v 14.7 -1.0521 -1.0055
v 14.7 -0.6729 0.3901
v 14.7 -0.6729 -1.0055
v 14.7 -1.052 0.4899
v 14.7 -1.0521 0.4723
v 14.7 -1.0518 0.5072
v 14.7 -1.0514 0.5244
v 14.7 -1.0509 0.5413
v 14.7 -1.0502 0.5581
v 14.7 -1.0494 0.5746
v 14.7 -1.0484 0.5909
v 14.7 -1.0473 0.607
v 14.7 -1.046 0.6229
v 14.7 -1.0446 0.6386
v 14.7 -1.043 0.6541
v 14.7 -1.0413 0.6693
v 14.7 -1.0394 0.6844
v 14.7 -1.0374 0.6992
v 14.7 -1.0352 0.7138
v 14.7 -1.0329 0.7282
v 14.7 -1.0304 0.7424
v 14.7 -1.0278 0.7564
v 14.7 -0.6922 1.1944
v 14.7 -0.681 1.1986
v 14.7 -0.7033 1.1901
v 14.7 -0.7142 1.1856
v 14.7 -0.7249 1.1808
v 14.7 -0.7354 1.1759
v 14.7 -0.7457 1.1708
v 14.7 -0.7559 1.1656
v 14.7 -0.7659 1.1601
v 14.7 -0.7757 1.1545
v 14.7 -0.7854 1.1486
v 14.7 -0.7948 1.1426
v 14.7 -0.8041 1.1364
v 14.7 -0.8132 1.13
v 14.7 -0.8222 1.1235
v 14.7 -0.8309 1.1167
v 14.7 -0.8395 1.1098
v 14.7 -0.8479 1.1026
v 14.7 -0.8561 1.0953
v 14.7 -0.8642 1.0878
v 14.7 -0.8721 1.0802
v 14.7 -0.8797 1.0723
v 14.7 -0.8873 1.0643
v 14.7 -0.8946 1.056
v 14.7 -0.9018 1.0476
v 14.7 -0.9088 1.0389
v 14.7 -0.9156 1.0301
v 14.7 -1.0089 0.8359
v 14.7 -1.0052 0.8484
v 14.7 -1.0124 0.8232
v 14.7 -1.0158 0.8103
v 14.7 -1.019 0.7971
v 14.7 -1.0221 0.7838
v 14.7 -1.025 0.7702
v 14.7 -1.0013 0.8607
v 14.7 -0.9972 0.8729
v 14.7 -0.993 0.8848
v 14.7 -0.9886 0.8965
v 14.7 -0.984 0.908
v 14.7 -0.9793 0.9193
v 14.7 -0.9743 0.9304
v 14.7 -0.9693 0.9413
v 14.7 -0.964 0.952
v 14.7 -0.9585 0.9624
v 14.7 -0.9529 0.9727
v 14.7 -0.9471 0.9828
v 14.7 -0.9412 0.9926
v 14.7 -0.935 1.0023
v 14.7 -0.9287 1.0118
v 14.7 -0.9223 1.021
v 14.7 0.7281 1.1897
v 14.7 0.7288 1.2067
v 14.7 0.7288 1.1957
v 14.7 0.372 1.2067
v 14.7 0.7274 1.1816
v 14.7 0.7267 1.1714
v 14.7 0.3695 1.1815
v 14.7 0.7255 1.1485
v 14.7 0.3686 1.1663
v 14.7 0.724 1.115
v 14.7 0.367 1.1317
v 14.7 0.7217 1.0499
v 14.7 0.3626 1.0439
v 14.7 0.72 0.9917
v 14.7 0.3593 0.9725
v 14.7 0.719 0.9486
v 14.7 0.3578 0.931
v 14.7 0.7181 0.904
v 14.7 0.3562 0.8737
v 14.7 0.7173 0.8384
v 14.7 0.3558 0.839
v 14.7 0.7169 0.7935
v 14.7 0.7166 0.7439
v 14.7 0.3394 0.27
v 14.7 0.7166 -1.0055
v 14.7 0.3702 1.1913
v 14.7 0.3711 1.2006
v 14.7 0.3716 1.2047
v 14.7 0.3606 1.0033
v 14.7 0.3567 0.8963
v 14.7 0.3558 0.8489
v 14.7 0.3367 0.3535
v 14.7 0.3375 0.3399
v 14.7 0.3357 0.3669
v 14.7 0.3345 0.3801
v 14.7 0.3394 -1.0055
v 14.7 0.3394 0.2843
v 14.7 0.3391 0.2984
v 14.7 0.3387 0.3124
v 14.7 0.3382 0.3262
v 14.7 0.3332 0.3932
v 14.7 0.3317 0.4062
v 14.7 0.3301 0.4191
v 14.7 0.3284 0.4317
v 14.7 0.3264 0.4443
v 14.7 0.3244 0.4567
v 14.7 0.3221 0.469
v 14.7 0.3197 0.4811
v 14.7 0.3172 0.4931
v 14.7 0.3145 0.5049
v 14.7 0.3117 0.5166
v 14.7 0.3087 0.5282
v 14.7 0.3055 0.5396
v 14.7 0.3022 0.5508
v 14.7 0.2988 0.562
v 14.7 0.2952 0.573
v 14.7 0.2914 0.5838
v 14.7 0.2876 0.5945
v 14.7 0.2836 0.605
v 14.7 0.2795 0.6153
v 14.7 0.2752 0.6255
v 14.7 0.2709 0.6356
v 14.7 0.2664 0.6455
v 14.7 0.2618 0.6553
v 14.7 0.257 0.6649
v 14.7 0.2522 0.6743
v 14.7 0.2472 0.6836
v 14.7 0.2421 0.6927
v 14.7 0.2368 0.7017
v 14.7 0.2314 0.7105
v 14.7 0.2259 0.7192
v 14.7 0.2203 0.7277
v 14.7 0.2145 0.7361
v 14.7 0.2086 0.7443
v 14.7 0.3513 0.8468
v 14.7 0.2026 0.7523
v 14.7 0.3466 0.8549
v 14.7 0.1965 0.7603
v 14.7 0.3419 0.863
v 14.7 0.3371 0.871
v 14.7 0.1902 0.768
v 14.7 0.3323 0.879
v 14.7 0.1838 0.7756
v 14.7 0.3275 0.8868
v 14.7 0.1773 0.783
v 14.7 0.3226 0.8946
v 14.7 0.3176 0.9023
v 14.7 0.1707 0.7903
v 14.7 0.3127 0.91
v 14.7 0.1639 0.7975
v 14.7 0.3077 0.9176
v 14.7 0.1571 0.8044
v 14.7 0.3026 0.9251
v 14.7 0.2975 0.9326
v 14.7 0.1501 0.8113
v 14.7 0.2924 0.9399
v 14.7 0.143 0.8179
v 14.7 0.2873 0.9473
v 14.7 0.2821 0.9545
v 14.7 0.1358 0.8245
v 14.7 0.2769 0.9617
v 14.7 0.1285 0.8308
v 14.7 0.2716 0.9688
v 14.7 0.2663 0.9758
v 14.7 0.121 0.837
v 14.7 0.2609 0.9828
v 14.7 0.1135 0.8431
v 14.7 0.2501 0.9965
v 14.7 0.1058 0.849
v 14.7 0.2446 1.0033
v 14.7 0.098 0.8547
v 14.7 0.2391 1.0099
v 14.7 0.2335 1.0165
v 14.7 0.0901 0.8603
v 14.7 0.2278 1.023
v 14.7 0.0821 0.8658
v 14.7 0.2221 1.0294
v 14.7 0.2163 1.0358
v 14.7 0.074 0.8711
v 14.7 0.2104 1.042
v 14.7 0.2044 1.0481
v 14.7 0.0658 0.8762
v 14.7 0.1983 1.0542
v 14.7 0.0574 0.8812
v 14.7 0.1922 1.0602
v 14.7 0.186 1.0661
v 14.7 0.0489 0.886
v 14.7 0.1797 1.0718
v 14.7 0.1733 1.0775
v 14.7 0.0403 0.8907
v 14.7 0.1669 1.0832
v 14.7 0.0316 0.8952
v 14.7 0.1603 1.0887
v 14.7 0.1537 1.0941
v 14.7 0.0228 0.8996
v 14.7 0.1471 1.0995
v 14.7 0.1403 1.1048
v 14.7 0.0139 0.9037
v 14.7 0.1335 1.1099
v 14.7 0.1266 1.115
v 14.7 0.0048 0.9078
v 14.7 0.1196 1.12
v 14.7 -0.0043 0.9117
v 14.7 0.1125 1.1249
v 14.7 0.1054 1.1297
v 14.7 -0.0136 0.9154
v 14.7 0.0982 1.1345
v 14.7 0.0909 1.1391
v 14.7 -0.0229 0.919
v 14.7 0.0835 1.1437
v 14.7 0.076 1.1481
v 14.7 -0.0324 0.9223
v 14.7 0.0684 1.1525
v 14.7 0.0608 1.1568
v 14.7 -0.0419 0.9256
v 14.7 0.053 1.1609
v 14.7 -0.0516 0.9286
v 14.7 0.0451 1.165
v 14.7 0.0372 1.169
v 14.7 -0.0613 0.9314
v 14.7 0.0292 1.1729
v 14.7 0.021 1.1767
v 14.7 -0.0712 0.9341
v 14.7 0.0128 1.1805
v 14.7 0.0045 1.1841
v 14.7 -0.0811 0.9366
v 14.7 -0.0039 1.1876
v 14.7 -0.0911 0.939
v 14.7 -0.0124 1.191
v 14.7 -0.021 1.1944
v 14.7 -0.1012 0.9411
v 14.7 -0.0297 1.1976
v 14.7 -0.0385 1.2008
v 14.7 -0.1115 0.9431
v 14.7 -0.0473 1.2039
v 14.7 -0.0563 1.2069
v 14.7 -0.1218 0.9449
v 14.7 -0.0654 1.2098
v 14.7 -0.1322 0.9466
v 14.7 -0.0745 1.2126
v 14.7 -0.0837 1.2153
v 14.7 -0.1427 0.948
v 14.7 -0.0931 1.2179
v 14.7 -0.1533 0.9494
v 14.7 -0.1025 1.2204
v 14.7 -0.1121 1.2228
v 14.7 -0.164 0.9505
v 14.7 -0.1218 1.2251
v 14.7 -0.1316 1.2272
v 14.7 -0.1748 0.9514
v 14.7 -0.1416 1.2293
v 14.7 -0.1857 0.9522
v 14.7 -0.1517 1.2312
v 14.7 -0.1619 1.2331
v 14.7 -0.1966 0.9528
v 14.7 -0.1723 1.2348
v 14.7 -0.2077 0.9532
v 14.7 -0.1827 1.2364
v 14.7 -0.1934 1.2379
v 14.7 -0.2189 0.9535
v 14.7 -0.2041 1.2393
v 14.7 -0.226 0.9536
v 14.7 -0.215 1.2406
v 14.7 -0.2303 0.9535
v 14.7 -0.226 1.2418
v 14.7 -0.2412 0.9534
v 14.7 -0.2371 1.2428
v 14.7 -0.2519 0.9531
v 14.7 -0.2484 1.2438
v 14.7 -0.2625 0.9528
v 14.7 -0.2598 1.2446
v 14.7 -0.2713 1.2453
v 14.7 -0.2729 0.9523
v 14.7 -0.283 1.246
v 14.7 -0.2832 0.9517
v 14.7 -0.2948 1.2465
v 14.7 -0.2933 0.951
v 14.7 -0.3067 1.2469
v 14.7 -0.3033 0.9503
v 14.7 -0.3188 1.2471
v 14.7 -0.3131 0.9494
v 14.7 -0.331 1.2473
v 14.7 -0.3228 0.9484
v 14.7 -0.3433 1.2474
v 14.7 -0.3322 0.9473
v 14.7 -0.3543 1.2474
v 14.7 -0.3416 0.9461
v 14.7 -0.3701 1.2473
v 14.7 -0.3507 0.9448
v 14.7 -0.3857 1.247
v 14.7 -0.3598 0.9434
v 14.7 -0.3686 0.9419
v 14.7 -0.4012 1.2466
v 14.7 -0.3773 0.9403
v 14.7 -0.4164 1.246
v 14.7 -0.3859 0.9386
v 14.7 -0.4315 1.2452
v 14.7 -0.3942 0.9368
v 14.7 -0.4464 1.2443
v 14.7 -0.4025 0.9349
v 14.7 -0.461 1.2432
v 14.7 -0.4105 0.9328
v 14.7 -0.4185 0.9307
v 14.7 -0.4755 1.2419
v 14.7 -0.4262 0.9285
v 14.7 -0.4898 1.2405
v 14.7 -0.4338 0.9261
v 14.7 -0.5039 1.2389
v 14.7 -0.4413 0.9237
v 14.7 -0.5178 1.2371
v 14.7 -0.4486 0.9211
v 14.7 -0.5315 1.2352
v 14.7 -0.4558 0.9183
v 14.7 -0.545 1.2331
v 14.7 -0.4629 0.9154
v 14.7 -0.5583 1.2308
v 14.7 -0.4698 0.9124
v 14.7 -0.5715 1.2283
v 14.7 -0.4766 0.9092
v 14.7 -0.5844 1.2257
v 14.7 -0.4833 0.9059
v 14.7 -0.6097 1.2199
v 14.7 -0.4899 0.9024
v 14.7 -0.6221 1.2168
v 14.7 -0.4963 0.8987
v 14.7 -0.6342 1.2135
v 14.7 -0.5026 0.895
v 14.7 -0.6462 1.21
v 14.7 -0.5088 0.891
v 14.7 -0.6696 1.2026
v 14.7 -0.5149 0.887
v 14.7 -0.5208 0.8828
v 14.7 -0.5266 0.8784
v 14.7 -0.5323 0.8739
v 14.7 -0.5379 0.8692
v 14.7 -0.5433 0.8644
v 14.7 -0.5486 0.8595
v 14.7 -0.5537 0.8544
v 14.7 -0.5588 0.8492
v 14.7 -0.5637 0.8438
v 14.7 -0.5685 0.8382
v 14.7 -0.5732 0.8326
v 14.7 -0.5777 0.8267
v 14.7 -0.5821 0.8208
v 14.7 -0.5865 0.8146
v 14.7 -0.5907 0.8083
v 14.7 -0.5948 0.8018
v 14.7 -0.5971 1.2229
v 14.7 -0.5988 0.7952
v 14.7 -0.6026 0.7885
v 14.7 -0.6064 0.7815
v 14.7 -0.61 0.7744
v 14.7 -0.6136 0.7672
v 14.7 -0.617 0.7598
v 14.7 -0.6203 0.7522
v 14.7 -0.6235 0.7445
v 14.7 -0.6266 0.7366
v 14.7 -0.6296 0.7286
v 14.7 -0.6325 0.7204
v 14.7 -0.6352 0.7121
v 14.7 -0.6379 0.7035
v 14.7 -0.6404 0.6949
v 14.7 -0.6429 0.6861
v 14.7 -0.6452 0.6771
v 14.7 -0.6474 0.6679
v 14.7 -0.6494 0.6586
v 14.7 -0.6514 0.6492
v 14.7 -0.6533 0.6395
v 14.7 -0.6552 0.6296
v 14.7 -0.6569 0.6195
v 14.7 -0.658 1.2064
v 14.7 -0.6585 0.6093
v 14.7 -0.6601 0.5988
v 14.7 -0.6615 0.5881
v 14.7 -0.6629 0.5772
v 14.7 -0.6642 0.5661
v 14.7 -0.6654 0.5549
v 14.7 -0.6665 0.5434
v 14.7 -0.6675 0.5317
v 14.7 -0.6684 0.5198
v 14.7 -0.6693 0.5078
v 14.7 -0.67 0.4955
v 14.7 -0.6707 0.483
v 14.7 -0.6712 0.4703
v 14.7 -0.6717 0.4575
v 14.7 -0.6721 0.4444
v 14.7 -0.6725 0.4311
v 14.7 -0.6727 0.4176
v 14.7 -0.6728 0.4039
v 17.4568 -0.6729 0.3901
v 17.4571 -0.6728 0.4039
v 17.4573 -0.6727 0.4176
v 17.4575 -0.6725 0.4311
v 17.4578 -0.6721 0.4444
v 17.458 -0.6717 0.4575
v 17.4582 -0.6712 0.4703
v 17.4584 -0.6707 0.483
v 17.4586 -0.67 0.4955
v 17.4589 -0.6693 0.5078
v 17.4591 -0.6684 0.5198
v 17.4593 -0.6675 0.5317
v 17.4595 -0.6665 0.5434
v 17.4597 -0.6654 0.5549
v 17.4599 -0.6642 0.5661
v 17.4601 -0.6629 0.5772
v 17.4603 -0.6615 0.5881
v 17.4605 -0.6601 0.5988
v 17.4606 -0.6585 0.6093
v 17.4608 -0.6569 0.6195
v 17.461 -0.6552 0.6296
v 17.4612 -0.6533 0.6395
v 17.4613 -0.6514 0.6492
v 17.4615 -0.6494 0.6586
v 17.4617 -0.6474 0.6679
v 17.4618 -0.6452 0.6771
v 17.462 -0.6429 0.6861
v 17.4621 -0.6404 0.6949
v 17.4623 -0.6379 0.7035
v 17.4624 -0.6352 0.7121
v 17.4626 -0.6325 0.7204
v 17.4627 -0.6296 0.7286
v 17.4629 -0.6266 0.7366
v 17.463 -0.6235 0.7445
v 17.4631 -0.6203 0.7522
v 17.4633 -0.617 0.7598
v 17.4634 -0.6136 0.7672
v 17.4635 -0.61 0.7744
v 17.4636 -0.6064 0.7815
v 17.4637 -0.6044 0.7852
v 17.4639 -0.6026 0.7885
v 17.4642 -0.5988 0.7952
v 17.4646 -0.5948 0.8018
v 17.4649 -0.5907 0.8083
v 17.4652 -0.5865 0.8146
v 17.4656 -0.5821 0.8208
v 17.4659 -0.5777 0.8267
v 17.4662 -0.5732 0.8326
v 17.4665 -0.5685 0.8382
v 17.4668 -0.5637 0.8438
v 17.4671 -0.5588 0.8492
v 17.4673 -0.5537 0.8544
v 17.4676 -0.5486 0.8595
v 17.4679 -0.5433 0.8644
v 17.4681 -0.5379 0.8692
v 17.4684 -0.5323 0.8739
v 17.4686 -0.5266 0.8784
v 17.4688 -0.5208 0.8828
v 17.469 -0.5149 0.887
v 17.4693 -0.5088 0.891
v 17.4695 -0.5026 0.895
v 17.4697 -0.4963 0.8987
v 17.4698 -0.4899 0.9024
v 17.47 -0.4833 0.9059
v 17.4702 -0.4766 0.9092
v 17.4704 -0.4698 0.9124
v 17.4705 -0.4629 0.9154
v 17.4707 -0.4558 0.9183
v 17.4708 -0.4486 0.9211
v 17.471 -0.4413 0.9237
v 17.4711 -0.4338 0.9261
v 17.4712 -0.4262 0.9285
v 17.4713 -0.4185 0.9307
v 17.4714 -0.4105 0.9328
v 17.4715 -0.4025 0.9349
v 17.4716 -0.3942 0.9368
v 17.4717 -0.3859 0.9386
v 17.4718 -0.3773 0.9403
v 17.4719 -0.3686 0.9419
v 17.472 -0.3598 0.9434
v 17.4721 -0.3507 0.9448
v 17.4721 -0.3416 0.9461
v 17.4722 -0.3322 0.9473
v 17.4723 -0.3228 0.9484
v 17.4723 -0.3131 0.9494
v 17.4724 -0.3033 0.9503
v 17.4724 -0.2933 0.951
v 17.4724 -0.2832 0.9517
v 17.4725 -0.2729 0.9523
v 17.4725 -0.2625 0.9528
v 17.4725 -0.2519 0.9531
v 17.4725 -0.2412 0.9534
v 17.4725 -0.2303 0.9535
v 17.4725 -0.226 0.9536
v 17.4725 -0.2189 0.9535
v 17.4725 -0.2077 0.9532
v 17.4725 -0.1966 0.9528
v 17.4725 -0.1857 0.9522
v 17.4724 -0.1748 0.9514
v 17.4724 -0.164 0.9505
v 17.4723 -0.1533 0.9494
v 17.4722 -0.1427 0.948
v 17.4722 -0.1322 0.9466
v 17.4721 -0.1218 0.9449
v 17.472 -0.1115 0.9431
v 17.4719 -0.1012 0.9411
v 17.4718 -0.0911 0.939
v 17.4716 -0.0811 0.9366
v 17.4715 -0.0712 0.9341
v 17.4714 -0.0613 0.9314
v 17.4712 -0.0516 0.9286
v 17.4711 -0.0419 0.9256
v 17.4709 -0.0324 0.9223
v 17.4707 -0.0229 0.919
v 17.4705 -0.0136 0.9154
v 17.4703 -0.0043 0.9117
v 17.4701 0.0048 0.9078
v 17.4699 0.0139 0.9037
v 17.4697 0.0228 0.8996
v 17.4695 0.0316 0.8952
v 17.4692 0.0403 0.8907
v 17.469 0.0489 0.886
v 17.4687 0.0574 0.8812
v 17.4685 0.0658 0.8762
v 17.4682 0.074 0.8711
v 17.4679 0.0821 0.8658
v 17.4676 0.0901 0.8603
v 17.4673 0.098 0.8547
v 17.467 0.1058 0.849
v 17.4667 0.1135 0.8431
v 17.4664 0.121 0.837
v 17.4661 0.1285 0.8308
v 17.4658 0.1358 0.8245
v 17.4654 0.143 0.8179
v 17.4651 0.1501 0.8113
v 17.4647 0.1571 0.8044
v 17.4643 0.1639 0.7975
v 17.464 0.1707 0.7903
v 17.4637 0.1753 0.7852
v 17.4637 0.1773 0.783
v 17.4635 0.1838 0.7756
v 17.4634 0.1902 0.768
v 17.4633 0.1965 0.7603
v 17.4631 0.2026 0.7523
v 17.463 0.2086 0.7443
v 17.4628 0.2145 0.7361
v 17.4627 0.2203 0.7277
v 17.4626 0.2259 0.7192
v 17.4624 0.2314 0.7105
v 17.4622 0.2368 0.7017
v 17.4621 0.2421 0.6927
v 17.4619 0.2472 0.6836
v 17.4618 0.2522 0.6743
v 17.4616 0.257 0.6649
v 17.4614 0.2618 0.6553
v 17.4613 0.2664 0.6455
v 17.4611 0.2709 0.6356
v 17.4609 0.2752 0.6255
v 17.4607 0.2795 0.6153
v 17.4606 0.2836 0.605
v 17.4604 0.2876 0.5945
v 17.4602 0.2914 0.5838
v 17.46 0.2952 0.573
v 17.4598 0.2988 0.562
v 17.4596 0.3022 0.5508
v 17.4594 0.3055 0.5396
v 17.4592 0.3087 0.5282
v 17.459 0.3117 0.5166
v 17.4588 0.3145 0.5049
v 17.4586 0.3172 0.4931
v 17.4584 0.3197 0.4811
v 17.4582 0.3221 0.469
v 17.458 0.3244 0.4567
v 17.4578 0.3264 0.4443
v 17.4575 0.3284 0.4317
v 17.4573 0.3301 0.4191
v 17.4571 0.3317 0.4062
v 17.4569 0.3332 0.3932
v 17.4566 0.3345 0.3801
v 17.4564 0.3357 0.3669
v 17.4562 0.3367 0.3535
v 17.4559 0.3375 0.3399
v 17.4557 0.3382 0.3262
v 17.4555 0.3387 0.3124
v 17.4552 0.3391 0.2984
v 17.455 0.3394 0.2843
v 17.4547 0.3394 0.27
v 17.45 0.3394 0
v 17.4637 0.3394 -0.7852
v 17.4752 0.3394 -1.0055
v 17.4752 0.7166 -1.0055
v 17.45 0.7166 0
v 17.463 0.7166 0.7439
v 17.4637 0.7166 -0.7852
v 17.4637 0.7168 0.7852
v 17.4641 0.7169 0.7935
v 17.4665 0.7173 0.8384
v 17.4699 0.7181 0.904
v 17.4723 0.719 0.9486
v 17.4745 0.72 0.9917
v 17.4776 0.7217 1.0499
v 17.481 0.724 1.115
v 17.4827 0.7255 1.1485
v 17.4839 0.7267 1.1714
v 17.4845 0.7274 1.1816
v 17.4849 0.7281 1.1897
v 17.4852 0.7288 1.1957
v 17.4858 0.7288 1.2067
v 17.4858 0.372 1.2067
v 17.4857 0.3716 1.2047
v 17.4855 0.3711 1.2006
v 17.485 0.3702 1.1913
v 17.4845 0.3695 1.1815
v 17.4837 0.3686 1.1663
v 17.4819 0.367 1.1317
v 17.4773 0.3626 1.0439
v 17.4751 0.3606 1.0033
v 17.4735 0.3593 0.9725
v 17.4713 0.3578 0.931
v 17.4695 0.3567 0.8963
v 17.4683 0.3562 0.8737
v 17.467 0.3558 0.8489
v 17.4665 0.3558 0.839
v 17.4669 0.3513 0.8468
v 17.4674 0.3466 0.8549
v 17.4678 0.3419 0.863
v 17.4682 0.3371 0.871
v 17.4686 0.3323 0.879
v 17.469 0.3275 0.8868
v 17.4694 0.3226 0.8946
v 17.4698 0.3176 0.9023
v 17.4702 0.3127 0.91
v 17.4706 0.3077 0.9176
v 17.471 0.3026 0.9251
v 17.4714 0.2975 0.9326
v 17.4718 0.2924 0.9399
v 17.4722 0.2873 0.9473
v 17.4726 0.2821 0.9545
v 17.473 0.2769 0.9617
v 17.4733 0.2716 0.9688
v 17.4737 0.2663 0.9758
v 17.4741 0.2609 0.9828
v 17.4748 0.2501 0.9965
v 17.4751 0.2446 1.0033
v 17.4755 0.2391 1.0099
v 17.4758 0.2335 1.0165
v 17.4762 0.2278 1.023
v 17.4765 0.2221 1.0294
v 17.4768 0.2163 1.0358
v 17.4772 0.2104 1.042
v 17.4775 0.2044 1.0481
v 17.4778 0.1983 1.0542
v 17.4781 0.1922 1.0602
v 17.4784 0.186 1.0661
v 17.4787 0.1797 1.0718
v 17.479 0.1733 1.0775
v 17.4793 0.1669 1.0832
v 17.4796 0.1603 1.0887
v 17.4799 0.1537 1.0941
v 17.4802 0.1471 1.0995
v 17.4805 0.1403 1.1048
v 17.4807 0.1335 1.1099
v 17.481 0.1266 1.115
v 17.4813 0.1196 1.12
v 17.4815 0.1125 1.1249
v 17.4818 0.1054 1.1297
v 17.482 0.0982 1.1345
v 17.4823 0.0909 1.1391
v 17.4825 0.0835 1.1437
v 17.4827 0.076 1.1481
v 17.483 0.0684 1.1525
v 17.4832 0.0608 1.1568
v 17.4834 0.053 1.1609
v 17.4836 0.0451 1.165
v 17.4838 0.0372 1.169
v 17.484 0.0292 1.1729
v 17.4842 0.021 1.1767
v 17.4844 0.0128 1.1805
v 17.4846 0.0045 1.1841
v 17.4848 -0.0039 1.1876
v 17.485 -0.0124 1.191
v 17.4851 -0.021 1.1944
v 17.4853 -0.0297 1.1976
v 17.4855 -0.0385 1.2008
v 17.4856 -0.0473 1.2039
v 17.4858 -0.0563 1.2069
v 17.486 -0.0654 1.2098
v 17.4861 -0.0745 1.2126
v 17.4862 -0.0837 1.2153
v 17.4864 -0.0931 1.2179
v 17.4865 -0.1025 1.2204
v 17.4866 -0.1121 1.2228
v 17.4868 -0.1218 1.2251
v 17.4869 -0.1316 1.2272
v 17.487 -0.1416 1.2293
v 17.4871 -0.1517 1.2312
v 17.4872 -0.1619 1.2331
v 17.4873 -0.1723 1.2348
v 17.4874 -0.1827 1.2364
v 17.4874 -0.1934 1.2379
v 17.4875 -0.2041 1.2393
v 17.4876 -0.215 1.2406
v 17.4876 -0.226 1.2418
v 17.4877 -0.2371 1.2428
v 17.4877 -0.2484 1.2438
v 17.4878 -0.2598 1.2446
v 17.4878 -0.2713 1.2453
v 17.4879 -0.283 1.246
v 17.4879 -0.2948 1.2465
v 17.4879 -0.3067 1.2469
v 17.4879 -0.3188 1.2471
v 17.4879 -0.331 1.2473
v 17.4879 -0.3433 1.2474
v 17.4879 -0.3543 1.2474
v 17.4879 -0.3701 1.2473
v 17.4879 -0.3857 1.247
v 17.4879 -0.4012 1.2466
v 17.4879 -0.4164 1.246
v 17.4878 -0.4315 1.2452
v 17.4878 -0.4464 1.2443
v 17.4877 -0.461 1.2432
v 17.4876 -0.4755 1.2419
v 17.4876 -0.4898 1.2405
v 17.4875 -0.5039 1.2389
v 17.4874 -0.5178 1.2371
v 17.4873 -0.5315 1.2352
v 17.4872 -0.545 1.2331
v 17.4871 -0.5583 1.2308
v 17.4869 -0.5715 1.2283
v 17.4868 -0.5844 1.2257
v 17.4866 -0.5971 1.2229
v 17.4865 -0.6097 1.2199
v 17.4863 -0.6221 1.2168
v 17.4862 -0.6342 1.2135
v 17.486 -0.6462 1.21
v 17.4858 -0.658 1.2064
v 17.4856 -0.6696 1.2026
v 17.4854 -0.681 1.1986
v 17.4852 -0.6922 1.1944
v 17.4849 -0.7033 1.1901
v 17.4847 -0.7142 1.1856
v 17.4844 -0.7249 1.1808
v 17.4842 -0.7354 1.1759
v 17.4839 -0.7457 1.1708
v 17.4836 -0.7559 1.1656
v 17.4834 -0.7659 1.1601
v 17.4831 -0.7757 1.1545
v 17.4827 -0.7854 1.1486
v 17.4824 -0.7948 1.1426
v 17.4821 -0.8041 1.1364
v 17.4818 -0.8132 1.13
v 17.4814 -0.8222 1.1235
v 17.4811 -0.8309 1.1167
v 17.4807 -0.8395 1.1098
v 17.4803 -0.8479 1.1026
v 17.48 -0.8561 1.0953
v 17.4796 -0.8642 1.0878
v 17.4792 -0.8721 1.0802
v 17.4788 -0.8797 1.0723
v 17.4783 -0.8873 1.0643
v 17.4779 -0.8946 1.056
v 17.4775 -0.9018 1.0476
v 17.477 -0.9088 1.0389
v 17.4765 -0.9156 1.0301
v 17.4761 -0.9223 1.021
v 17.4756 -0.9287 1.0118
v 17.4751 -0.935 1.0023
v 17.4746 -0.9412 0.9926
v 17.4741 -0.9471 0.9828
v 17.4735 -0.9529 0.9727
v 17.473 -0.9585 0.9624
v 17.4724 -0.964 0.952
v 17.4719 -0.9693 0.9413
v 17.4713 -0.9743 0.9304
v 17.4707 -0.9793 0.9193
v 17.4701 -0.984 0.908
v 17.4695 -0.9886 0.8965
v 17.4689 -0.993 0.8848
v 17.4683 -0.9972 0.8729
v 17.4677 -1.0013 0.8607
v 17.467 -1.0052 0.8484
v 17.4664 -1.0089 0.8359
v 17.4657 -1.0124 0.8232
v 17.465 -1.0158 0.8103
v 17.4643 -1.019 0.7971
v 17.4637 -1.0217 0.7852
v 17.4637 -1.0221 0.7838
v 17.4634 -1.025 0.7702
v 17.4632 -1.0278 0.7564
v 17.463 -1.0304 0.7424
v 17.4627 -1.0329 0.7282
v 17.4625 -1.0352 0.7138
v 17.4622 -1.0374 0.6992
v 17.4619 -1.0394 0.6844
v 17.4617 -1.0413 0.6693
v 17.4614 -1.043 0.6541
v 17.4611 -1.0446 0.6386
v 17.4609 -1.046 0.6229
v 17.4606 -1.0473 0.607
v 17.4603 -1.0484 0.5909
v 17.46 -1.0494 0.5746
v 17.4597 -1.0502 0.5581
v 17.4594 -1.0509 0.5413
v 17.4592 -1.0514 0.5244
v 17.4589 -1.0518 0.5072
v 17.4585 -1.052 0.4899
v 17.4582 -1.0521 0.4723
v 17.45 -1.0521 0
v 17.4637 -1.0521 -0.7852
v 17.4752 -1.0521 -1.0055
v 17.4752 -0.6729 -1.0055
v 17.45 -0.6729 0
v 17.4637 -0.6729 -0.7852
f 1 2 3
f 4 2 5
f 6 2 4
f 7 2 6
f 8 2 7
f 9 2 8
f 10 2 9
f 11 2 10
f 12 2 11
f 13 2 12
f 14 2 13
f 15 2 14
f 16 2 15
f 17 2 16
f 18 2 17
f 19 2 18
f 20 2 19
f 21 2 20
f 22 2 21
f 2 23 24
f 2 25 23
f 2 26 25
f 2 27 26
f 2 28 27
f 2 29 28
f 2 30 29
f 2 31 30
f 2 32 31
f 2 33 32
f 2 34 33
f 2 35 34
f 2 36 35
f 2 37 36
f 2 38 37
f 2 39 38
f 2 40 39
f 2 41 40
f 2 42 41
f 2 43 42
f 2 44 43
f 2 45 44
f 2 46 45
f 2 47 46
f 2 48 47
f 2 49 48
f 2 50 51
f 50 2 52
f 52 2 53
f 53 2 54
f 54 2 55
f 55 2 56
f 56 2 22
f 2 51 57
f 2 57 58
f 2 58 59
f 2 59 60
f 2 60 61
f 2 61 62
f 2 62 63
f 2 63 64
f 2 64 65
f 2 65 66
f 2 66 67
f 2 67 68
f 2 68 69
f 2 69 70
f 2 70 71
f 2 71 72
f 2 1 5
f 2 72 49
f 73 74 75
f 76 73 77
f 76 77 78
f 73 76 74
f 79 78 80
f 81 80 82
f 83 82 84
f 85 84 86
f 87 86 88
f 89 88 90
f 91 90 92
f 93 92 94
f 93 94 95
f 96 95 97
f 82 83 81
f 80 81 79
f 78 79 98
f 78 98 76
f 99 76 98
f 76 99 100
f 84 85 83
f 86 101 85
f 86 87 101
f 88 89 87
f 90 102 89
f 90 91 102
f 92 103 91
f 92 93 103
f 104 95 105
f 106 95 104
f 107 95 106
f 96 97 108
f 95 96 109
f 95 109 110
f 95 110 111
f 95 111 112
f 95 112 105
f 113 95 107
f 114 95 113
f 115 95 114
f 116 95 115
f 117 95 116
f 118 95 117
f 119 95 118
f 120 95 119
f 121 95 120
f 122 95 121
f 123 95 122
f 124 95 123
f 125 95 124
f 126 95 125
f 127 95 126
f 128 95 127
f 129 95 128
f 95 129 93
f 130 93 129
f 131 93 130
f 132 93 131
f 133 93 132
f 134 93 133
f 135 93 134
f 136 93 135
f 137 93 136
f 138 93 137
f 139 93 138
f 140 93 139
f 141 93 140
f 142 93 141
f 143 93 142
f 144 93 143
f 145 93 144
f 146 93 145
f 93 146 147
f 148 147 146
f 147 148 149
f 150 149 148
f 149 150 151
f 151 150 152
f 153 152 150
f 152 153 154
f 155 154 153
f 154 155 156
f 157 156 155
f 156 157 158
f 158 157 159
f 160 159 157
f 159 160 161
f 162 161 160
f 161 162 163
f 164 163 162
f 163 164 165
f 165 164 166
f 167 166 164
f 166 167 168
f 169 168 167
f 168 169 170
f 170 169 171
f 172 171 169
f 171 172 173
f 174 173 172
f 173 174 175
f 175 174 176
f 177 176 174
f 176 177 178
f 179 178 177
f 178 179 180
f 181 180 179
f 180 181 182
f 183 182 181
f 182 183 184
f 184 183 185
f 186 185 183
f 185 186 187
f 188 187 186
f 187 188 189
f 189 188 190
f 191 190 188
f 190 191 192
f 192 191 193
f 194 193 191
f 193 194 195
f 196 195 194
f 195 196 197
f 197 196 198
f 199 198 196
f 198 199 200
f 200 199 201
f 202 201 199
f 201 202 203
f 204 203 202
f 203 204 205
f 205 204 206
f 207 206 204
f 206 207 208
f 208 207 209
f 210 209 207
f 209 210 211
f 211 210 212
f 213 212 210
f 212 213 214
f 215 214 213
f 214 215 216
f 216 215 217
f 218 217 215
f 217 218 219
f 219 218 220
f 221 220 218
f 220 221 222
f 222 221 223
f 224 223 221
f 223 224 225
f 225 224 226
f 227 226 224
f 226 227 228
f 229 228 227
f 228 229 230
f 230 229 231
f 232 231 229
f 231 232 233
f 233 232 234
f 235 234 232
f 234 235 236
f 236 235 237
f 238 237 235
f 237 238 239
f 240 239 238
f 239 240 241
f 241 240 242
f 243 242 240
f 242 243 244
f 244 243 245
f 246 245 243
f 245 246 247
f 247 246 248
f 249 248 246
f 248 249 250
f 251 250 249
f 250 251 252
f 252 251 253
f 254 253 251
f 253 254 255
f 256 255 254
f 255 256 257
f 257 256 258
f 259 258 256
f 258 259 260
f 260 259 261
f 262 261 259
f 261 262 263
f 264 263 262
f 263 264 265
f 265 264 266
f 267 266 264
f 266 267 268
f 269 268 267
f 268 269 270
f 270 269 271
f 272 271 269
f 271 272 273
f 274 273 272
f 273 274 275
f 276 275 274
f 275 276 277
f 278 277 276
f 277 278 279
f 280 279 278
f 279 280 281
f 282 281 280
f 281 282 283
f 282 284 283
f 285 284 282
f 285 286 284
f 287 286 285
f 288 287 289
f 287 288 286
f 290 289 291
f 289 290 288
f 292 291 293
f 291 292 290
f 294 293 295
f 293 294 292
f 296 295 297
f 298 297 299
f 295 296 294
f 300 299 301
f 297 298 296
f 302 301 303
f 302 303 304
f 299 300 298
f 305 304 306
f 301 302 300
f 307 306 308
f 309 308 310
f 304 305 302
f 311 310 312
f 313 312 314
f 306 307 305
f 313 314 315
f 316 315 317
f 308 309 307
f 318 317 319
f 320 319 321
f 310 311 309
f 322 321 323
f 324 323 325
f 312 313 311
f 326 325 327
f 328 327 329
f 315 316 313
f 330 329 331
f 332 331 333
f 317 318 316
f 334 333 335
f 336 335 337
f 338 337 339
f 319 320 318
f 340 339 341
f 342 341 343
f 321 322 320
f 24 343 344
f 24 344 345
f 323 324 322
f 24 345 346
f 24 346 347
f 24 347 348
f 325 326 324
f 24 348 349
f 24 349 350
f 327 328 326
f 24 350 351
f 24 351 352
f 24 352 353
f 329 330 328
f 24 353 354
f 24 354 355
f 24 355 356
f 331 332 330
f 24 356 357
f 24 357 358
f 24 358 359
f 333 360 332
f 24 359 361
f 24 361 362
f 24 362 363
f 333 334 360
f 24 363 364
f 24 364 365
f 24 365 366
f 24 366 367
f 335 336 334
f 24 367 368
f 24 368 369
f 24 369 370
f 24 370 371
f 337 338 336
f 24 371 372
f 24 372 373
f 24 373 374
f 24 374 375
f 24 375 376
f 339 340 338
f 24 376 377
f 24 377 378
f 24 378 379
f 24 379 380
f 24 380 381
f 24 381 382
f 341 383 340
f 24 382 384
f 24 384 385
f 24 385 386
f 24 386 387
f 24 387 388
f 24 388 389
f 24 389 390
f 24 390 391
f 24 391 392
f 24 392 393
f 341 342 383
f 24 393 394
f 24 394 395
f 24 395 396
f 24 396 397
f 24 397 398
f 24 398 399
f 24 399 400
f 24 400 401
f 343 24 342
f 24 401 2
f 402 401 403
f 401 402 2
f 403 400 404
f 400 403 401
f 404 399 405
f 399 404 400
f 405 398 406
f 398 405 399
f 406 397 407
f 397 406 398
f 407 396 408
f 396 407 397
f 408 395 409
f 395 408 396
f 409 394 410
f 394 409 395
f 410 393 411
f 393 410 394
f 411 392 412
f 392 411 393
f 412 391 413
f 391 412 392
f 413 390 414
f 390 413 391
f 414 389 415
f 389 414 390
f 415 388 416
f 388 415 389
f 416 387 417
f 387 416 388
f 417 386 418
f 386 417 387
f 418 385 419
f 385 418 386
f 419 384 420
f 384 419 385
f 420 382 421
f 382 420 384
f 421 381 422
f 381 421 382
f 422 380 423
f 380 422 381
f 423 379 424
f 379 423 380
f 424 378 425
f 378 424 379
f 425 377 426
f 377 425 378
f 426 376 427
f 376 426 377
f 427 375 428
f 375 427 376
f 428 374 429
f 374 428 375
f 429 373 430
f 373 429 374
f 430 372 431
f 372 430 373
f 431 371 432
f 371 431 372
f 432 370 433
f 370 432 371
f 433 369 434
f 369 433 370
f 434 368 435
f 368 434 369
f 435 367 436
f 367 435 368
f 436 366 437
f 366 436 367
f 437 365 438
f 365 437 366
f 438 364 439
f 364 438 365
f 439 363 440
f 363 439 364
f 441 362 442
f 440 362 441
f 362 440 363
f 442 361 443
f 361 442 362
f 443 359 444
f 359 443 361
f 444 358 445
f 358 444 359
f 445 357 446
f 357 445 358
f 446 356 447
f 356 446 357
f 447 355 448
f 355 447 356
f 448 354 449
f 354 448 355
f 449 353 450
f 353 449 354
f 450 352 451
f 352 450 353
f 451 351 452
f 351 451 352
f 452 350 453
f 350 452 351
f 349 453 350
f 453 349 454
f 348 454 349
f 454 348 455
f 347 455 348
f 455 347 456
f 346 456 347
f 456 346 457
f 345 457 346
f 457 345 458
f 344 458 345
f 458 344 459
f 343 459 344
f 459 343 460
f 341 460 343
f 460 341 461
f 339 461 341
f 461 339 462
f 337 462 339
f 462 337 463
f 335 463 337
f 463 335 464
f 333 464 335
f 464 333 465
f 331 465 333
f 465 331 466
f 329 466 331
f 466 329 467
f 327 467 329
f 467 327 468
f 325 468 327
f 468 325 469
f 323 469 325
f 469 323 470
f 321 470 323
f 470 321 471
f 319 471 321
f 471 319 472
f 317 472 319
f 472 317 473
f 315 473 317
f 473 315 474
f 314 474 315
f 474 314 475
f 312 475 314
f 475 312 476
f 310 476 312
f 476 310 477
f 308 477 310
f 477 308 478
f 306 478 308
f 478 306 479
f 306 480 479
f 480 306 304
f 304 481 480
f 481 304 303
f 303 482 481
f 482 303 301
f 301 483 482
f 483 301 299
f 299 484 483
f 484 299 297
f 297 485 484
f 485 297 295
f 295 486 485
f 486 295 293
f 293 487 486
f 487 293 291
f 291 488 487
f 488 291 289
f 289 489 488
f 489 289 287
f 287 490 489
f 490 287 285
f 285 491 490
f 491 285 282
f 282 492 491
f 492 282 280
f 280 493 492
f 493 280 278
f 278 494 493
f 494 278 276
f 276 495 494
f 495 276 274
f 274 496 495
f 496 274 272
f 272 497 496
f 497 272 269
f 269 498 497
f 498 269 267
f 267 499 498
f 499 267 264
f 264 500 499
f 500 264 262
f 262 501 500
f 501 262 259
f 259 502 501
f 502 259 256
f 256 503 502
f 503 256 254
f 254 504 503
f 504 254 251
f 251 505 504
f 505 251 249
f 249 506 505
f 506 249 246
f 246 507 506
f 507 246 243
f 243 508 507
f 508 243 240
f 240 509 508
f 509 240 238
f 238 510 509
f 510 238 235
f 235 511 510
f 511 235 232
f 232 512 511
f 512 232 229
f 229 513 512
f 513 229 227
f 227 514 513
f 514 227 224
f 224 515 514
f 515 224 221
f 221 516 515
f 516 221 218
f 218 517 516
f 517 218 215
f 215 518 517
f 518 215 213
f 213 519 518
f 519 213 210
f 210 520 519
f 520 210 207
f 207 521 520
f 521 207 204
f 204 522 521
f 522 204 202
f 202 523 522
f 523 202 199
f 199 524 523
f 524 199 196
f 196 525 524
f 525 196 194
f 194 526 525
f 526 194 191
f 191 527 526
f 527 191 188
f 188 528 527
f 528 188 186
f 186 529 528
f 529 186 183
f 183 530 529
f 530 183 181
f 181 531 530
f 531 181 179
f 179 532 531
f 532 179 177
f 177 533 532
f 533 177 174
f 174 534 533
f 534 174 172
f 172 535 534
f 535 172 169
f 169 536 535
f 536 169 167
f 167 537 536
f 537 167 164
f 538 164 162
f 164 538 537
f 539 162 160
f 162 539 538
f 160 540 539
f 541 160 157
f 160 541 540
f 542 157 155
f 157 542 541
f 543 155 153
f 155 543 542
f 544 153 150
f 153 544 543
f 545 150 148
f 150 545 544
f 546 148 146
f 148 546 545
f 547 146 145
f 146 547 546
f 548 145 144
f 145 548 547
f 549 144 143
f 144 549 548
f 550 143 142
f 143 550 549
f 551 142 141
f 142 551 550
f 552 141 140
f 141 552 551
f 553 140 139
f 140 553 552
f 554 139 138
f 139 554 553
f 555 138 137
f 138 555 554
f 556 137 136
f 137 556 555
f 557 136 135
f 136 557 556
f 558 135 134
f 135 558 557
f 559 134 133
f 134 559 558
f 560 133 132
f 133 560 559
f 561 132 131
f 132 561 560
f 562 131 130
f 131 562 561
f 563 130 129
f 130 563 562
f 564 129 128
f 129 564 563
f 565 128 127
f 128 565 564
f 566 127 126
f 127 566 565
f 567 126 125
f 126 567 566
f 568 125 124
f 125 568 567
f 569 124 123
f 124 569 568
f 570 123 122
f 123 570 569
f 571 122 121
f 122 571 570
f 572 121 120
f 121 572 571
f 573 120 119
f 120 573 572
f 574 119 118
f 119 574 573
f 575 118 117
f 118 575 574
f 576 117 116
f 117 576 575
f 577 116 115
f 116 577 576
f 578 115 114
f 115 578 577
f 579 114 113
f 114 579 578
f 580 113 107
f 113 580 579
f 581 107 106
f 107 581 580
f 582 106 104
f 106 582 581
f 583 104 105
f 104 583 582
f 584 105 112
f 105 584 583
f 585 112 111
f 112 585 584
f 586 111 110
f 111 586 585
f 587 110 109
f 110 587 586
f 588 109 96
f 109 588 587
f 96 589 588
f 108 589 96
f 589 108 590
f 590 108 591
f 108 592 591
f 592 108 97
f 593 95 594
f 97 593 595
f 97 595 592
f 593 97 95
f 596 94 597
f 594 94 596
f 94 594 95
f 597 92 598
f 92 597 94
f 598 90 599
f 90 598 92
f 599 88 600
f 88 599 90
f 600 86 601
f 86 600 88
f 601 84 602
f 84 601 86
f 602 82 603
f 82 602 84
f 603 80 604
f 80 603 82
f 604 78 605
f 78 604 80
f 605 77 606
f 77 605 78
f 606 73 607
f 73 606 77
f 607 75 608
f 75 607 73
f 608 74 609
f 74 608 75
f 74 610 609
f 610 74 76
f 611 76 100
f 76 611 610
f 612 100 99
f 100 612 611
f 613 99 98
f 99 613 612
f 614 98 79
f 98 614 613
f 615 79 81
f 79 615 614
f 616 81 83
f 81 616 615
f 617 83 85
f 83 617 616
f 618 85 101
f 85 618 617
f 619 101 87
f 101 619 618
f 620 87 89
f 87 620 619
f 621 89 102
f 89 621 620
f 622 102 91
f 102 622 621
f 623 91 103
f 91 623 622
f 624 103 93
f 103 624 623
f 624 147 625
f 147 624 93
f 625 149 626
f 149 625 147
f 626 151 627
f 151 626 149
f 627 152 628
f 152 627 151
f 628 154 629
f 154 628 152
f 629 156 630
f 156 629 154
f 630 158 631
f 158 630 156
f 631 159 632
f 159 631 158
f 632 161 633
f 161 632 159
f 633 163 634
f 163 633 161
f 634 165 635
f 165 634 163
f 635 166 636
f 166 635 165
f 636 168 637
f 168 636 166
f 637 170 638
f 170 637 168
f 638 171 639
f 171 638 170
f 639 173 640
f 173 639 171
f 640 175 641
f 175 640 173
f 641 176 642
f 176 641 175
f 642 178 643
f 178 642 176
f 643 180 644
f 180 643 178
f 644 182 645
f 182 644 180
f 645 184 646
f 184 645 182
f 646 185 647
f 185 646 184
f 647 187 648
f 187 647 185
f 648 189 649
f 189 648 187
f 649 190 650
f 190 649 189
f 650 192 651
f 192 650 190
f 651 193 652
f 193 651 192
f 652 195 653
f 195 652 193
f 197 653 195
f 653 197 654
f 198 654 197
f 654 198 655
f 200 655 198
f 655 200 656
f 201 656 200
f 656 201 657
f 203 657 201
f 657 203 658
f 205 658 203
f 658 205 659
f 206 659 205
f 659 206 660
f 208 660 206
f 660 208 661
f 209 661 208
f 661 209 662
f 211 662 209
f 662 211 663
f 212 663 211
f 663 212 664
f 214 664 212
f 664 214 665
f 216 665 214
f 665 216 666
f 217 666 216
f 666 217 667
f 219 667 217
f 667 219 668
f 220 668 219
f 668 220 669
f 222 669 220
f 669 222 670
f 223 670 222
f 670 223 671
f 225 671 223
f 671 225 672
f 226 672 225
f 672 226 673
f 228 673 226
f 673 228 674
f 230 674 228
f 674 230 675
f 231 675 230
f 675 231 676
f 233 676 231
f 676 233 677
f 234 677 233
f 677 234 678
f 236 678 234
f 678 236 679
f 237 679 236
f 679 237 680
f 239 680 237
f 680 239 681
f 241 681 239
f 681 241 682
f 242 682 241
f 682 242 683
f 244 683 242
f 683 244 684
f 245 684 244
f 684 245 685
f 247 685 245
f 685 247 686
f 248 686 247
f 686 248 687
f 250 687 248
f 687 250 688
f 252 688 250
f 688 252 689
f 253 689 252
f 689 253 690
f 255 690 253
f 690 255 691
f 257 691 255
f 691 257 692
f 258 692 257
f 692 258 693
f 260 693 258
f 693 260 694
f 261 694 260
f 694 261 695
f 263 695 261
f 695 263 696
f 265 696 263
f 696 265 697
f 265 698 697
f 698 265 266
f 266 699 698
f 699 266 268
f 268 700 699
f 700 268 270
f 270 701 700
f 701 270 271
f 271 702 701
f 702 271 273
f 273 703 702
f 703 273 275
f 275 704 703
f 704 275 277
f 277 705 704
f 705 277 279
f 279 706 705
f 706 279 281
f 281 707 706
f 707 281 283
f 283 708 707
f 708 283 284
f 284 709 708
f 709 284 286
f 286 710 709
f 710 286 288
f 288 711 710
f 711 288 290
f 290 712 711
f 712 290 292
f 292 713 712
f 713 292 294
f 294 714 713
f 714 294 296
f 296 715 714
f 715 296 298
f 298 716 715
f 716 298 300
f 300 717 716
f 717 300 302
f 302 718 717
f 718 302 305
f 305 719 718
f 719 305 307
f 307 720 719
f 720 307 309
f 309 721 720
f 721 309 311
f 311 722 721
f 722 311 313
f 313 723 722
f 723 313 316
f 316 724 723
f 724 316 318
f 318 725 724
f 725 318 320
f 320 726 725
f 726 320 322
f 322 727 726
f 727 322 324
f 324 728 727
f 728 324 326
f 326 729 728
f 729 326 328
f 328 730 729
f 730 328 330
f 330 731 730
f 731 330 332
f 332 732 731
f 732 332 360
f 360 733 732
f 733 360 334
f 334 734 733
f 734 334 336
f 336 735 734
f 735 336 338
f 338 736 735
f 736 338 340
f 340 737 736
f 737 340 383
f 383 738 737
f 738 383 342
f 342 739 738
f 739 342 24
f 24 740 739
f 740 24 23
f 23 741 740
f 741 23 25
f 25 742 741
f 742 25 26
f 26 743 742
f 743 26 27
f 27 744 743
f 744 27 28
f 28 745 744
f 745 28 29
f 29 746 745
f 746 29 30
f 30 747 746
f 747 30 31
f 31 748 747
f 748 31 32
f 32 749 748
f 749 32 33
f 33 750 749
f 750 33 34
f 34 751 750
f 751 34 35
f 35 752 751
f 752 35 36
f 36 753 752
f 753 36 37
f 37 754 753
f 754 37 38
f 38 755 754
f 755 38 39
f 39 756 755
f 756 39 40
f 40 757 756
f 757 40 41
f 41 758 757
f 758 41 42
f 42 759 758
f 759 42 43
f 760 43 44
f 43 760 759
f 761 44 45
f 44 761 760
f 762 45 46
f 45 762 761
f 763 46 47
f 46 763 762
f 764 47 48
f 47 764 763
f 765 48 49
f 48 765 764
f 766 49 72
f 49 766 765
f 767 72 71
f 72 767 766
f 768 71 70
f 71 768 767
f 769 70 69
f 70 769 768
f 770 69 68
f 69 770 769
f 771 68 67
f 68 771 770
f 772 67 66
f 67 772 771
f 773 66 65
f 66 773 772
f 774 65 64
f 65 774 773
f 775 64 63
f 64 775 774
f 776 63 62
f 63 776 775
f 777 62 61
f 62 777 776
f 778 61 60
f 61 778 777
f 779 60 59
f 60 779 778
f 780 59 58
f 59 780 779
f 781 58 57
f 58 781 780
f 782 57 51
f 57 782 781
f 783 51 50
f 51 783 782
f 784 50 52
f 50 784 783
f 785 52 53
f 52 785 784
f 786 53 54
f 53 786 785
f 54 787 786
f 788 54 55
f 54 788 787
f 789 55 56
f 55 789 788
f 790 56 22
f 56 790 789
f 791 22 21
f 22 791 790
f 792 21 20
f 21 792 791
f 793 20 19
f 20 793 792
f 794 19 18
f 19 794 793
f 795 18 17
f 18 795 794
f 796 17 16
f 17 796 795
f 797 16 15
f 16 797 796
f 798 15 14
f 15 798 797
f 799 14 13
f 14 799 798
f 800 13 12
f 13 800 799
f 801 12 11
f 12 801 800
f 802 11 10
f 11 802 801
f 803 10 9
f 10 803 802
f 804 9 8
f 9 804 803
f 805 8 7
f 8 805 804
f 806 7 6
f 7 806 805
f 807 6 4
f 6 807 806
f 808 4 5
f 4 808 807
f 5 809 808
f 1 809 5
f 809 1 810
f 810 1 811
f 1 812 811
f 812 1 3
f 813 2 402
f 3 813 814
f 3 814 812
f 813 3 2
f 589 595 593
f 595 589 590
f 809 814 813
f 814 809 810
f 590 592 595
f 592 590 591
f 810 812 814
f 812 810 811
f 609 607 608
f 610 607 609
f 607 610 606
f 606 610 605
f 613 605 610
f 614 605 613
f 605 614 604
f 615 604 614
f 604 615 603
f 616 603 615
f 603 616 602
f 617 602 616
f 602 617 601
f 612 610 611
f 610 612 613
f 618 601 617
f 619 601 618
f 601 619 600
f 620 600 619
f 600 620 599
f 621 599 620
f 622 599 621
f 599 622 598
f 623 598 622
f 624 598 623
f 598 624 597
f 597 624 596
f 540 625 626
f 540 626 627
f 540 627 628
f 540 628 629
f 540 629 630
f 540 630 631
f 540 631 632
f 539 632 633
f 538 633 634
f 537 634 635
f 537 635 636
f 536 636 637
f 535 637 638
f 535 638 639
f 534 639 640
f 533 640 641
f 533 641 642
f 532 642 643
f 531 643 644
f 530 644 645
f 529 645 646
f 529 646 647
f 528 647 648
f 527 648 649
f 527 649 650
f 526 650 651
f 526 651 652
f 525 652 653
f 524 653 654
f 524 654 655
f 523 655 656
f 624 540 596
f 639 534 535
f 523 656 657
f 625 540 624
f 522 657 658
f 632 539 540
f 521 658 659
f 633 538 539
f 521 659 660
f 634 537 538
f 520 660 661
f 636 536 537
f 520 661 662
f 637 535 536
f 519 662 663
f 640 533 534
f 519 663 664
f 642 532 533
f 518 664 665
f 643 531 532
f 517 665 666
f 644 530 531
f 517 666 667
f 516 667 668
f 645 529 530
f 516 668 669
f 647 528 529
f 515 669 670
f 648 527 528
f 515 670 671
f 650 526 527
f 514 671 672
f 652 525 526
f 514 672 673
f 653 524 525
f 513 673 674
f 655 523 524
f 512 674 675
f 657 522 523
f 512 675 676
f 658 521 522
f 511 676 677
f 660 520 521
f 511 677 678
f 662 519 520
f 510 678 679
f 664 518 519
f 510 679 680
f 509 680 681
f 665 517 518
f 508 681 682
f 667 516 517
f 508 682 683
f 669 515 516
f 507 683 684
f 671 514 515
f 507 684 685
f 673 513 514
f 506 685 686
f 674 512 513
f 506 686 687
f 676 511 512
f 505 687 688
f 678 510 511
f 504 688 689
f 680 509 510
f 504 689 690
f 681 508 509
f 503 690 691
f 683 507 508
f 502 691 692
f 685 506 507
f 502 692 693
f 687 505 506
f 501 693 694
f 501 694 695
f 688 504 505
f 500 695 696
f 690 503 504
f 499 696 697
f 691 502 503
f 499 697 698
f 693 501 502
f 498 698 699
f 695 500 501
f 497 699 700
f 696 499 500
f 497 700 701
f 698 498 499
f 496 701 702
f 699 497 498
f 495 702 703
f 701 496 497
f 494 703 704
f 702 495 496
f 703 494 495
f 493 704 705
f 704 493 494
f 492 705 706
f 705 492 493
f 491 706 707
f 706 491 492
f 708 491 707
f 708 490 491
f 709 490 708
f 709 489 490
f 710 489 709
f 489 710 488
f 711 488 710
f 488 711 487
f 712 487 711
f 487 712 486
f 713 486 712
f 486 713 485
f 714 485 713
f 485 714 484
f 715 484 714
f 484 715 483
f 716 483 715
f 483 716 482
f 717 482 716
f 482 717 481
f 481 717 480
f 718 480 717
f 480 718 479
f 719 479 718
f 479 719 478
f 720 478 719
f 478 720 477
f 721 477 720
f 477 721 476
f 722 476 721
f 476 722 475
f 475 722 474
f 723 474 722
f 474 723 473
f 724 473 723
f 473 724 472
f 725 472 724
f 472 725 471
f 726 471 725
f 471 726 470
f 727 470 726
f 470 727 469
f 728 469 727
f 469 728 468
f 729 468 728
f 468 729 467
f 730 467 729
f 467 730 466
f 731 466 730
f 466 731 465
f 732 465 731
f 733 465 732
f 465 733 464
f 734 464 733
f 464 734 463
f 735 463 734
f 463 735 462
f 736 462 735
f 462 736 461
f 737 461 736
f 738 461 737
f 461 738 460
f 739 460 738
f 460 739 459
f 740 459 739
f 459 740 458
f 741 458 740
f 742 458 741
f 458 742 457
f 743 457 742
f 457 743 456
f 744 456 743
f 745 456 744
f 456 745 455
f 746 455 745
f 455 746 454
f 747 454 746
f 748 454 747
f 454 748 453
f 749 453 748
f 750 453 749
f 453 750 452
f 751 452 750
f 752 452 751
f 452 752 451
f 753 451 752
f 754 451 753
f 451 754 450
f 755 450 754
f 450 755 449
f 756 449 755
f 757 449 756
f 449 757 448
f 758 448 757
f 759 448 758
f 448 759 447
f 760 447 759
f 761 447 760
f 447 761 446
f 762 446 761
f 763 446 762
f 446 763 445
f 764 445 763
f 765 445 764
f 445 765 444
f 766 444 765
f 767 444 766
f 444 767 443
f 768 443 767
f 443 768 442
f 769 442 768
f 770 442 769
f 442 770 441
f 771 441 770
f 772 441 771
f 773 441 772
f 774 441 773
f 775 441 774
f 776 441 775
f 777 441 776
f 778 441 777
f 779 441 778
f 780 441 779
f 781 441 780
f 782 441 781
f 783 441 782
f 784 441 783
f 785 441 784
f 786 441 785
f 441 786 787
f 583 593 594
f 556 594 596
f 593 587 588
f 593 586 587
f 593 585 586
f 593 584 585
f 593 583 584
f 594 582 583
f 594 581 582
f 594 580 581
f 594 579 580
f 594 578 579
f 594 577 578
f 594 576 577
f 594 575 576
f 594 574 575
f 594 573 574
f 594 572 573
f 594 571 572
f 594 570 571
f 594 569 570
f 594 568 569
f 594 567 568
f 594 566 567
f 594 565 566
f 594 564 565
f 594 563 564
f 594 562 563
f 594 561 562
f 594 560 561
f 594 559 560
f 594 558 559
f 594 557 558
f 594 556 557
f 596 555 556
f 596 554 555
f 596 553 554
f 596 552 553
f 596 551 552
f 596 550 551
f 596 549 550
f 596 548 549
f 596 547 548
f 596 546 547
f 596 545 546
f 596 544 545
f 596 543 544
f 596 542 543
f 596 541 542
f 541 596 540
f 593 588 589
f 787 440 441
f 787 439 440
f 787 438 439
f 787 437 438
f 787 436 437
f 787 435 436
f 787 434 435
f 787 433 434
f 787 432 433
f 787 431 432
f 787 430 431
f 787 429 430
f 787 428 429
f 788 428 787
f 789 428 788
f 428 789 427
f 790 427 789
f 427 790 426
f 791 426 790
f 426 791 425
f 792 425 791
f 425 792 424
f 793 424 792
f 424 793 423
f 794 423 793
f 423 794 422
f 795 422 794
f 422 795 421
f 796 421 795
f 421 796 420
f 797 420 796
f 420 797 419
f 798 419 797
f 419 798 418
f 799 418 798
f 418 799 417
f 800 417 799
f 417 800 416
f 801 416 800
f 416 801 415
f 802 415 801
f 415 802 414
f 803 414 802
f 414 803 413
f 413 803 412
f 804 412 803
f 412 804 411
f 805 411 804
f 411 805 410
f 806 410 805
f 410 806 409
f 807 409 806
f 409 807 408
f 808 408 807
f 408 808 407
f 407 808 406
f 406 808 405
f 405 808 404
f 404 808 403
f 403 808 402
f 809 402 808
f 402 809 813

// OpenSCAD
//dairy's rendition of ibm selectric type element model
//Leonard Chau      November 4, 2024       t(-.-t)

/* [Global Parameters] */
z=.001;
$fn=180;
mink_fn=20;

/* [Rendering] */
//render something?
RENDER=false;
//render selection?
RENDER_MODE=0;//[0:Composer Element]
//render variant?
RENDER_VARIANT=0;//[0:plain, 1:resin print]
//turn on minkowski?
MINK_ON=false;

/* [Typeface Stuff] */
FONT="Arial";
FONTSIZE=3;
FONT_WEIGHT_OFFSET=0;//.01
X_WEIGHT_ADJUSTMENT=.01;
Y_WEIGHT_ADJUSTMENT=.01;
X_POS_OFFSET=1;
Y_POS_OFFSET=-1;


/* [Typeball Dimensions] */
//sphere diameter
SPHERE_OD=33.4;
//character-concave to character-concave diameter
MAX_OD=34.9;
//sphere center to top flat
TOPFLAT_TO_CENTER=11.4;
//shaft ID
SHAFT_ID=28.15;
//shaft boss height
BOSS_H=8.07;
//skirt top OD
SKIRT_TOP_OD=32.3;
//skirt bottom OD
SKIRT_BOTTOM_OD=30.2;
//overall thickness of element
ELEMENT_OAT=22.0;
//angle between characters
LATITUDE_SPACING=360/22;
//angle between rows
LONGITUDE_SPACING=[32.8, 16.4, 0, -16.4];
//platen diameter
PLATEN_OD=45;

/* [Character Mapping] */

//lowercase layout on machine; left to right, top to bottom
LOWERCASE88="

1234567890-=
qwertyuiop½
asdfghjkl;'
zxcvbnm,./

";

//uppercase layout on machine; left to right, top to bottom
UPPERCASE88="
!@#$%¢&*()_+
QWERTYUIOP¼
ASDFGHJKL:\"
ZXCVBNM,.?"
;

//uppercase composer layout on machine; left to right, top to bottom
LOWER_CASE_COMPOSER = str(
    "1234567890-=",
    "qwertyuiop?",
    "asdfghjkl][",
    "zxcvbnm,.;"
);

//lowercase composer layout on machine; left to right, top to bottom
UPPER_CASE_COMPOSER = str(
    "!†+$%/&*()_@",
    "QWERTYUIOP¾",
    "ASDFGHJKL¼½",
    "ZXCVBNM‘’:"
);

CASES88=[LOWER_CASE_COMPOSER,UPPER_CASE_COMPOSER];

//type element mapping starting at arrow, moving clockwise from the top, from top to bottom
ELEMENTMAP88="
s10928’‘/+$S!()†*.,634

iatb75¾_½CLIATB&%?-[cl

nrodwkXVUMHNRODWKxvumh

efgq;j@¼ZPYEFGQ:J=]zpy
";

//array for character, latitude integer, and longitude integer
CHAR_LAT_LONG=[for (i=[0:1]) for (j=[0:len(CASES88[0])-1]) 

    [CASES88[i][j], ceil(search(CASES88[i][j], str(ELEMENTMAP88))[0]/22+.001)-1, search(CASES88[i][j], str(ELEMENTMAP88))[0]%22]

];


echo(CHAR_LAT_LONG);






/* [Calculated Variables] */

//sphere radius
SPHERE_R=SPHERE_OD/2;
//skirt large radius
SKIRT_TOP_R=SKIRT_TOP_OD/2;
//center to ceiling of element
CEILING=TOPFLAT_TO_CENTER;
//center to floor of element
FLOOR=abs(TOPFLAT_TO_CENTER-ELEMENT_OAT);
//center to skirt of element
CENTER_TO_SKIRT=(SPHERE_R^2-SKIRT_TOP_R^2)^.5;
//platen radius
PLATEN_R=PLATEN_OD/2;
//height of letter
TYPE_ALTITUDE=(MAX_OD-SPHERE_OD)/2;



//make solid element
module FullBody(){
union(){
    sphere(d=SPHERE_OD);
    translate([0, 0, -FLOOR])
    cylinder(d1=SKIRT_BOTTOM_OD, d2=SKIRT_TOP_OD, h=FLOOR-CENTER_TO_SKIRT);
    }
}

module Text(char){
    offset(FONT_WEIGHT_OFFSET)
    minkowski(){
        translate([X_POS_OFFSET, Y_POS_OFFSET, 0])
        mirror([1, 0, 0])
        text(char, size=FONTSIZE, font=FONT, valign="baseline", halign="left");
        square([z+X_WEIGHT_ADJUSTMENT, z+Y_WEIGHT_ADJUSTMENT], center=true);
    }
}

module PlatenCutout(char){
            rotate([0, -GetLong(char), GetLat(char)])
            translate([SPHERE_R+PLATEN_R+TYPE_ALTITUDE, 0, 0])
            rotate([90, 0, 0])
            cylinder(d=PLATEN_OD, h=10, center=true);
}

module PositionText(char){
    rotate([90 - GetLong(char), 0, 90 + GetLat(char)])
    translate([0, 0, SPHERE_R-2])
    linear_extrude(6)
    Text(char);
}

module Render(){
    if (RENDER==true){
        FullBody();
    }
}

function GetLat(char)= CHAR_LAT_LONG[search(char, CHAR_LAT_LONG)[0]][2]*LATITUDE_SPACING;

function GetLong(char)= LONGITUDE_SPACING[CHAR_LAT_LONG[search(char, CHAR_LAT_LONG)[0]][1]];

module SingleMinkowski(char){
    minkowski(){
        difference(){
            PositionText(char);
            PlatenCutout(char);
            
        }
        if (MINK_ON==true){
            rotate([90 - GetLong(char), 0, 90 + GetLat(char)])
            translate([0, 0, -2])
            cylinder(d1=1.75, d2=0, h=2, $fn=mink_fn);
        }
    }
}



Render();
SingleMinkowski("n");

//PlatenCutout(0, 2);
